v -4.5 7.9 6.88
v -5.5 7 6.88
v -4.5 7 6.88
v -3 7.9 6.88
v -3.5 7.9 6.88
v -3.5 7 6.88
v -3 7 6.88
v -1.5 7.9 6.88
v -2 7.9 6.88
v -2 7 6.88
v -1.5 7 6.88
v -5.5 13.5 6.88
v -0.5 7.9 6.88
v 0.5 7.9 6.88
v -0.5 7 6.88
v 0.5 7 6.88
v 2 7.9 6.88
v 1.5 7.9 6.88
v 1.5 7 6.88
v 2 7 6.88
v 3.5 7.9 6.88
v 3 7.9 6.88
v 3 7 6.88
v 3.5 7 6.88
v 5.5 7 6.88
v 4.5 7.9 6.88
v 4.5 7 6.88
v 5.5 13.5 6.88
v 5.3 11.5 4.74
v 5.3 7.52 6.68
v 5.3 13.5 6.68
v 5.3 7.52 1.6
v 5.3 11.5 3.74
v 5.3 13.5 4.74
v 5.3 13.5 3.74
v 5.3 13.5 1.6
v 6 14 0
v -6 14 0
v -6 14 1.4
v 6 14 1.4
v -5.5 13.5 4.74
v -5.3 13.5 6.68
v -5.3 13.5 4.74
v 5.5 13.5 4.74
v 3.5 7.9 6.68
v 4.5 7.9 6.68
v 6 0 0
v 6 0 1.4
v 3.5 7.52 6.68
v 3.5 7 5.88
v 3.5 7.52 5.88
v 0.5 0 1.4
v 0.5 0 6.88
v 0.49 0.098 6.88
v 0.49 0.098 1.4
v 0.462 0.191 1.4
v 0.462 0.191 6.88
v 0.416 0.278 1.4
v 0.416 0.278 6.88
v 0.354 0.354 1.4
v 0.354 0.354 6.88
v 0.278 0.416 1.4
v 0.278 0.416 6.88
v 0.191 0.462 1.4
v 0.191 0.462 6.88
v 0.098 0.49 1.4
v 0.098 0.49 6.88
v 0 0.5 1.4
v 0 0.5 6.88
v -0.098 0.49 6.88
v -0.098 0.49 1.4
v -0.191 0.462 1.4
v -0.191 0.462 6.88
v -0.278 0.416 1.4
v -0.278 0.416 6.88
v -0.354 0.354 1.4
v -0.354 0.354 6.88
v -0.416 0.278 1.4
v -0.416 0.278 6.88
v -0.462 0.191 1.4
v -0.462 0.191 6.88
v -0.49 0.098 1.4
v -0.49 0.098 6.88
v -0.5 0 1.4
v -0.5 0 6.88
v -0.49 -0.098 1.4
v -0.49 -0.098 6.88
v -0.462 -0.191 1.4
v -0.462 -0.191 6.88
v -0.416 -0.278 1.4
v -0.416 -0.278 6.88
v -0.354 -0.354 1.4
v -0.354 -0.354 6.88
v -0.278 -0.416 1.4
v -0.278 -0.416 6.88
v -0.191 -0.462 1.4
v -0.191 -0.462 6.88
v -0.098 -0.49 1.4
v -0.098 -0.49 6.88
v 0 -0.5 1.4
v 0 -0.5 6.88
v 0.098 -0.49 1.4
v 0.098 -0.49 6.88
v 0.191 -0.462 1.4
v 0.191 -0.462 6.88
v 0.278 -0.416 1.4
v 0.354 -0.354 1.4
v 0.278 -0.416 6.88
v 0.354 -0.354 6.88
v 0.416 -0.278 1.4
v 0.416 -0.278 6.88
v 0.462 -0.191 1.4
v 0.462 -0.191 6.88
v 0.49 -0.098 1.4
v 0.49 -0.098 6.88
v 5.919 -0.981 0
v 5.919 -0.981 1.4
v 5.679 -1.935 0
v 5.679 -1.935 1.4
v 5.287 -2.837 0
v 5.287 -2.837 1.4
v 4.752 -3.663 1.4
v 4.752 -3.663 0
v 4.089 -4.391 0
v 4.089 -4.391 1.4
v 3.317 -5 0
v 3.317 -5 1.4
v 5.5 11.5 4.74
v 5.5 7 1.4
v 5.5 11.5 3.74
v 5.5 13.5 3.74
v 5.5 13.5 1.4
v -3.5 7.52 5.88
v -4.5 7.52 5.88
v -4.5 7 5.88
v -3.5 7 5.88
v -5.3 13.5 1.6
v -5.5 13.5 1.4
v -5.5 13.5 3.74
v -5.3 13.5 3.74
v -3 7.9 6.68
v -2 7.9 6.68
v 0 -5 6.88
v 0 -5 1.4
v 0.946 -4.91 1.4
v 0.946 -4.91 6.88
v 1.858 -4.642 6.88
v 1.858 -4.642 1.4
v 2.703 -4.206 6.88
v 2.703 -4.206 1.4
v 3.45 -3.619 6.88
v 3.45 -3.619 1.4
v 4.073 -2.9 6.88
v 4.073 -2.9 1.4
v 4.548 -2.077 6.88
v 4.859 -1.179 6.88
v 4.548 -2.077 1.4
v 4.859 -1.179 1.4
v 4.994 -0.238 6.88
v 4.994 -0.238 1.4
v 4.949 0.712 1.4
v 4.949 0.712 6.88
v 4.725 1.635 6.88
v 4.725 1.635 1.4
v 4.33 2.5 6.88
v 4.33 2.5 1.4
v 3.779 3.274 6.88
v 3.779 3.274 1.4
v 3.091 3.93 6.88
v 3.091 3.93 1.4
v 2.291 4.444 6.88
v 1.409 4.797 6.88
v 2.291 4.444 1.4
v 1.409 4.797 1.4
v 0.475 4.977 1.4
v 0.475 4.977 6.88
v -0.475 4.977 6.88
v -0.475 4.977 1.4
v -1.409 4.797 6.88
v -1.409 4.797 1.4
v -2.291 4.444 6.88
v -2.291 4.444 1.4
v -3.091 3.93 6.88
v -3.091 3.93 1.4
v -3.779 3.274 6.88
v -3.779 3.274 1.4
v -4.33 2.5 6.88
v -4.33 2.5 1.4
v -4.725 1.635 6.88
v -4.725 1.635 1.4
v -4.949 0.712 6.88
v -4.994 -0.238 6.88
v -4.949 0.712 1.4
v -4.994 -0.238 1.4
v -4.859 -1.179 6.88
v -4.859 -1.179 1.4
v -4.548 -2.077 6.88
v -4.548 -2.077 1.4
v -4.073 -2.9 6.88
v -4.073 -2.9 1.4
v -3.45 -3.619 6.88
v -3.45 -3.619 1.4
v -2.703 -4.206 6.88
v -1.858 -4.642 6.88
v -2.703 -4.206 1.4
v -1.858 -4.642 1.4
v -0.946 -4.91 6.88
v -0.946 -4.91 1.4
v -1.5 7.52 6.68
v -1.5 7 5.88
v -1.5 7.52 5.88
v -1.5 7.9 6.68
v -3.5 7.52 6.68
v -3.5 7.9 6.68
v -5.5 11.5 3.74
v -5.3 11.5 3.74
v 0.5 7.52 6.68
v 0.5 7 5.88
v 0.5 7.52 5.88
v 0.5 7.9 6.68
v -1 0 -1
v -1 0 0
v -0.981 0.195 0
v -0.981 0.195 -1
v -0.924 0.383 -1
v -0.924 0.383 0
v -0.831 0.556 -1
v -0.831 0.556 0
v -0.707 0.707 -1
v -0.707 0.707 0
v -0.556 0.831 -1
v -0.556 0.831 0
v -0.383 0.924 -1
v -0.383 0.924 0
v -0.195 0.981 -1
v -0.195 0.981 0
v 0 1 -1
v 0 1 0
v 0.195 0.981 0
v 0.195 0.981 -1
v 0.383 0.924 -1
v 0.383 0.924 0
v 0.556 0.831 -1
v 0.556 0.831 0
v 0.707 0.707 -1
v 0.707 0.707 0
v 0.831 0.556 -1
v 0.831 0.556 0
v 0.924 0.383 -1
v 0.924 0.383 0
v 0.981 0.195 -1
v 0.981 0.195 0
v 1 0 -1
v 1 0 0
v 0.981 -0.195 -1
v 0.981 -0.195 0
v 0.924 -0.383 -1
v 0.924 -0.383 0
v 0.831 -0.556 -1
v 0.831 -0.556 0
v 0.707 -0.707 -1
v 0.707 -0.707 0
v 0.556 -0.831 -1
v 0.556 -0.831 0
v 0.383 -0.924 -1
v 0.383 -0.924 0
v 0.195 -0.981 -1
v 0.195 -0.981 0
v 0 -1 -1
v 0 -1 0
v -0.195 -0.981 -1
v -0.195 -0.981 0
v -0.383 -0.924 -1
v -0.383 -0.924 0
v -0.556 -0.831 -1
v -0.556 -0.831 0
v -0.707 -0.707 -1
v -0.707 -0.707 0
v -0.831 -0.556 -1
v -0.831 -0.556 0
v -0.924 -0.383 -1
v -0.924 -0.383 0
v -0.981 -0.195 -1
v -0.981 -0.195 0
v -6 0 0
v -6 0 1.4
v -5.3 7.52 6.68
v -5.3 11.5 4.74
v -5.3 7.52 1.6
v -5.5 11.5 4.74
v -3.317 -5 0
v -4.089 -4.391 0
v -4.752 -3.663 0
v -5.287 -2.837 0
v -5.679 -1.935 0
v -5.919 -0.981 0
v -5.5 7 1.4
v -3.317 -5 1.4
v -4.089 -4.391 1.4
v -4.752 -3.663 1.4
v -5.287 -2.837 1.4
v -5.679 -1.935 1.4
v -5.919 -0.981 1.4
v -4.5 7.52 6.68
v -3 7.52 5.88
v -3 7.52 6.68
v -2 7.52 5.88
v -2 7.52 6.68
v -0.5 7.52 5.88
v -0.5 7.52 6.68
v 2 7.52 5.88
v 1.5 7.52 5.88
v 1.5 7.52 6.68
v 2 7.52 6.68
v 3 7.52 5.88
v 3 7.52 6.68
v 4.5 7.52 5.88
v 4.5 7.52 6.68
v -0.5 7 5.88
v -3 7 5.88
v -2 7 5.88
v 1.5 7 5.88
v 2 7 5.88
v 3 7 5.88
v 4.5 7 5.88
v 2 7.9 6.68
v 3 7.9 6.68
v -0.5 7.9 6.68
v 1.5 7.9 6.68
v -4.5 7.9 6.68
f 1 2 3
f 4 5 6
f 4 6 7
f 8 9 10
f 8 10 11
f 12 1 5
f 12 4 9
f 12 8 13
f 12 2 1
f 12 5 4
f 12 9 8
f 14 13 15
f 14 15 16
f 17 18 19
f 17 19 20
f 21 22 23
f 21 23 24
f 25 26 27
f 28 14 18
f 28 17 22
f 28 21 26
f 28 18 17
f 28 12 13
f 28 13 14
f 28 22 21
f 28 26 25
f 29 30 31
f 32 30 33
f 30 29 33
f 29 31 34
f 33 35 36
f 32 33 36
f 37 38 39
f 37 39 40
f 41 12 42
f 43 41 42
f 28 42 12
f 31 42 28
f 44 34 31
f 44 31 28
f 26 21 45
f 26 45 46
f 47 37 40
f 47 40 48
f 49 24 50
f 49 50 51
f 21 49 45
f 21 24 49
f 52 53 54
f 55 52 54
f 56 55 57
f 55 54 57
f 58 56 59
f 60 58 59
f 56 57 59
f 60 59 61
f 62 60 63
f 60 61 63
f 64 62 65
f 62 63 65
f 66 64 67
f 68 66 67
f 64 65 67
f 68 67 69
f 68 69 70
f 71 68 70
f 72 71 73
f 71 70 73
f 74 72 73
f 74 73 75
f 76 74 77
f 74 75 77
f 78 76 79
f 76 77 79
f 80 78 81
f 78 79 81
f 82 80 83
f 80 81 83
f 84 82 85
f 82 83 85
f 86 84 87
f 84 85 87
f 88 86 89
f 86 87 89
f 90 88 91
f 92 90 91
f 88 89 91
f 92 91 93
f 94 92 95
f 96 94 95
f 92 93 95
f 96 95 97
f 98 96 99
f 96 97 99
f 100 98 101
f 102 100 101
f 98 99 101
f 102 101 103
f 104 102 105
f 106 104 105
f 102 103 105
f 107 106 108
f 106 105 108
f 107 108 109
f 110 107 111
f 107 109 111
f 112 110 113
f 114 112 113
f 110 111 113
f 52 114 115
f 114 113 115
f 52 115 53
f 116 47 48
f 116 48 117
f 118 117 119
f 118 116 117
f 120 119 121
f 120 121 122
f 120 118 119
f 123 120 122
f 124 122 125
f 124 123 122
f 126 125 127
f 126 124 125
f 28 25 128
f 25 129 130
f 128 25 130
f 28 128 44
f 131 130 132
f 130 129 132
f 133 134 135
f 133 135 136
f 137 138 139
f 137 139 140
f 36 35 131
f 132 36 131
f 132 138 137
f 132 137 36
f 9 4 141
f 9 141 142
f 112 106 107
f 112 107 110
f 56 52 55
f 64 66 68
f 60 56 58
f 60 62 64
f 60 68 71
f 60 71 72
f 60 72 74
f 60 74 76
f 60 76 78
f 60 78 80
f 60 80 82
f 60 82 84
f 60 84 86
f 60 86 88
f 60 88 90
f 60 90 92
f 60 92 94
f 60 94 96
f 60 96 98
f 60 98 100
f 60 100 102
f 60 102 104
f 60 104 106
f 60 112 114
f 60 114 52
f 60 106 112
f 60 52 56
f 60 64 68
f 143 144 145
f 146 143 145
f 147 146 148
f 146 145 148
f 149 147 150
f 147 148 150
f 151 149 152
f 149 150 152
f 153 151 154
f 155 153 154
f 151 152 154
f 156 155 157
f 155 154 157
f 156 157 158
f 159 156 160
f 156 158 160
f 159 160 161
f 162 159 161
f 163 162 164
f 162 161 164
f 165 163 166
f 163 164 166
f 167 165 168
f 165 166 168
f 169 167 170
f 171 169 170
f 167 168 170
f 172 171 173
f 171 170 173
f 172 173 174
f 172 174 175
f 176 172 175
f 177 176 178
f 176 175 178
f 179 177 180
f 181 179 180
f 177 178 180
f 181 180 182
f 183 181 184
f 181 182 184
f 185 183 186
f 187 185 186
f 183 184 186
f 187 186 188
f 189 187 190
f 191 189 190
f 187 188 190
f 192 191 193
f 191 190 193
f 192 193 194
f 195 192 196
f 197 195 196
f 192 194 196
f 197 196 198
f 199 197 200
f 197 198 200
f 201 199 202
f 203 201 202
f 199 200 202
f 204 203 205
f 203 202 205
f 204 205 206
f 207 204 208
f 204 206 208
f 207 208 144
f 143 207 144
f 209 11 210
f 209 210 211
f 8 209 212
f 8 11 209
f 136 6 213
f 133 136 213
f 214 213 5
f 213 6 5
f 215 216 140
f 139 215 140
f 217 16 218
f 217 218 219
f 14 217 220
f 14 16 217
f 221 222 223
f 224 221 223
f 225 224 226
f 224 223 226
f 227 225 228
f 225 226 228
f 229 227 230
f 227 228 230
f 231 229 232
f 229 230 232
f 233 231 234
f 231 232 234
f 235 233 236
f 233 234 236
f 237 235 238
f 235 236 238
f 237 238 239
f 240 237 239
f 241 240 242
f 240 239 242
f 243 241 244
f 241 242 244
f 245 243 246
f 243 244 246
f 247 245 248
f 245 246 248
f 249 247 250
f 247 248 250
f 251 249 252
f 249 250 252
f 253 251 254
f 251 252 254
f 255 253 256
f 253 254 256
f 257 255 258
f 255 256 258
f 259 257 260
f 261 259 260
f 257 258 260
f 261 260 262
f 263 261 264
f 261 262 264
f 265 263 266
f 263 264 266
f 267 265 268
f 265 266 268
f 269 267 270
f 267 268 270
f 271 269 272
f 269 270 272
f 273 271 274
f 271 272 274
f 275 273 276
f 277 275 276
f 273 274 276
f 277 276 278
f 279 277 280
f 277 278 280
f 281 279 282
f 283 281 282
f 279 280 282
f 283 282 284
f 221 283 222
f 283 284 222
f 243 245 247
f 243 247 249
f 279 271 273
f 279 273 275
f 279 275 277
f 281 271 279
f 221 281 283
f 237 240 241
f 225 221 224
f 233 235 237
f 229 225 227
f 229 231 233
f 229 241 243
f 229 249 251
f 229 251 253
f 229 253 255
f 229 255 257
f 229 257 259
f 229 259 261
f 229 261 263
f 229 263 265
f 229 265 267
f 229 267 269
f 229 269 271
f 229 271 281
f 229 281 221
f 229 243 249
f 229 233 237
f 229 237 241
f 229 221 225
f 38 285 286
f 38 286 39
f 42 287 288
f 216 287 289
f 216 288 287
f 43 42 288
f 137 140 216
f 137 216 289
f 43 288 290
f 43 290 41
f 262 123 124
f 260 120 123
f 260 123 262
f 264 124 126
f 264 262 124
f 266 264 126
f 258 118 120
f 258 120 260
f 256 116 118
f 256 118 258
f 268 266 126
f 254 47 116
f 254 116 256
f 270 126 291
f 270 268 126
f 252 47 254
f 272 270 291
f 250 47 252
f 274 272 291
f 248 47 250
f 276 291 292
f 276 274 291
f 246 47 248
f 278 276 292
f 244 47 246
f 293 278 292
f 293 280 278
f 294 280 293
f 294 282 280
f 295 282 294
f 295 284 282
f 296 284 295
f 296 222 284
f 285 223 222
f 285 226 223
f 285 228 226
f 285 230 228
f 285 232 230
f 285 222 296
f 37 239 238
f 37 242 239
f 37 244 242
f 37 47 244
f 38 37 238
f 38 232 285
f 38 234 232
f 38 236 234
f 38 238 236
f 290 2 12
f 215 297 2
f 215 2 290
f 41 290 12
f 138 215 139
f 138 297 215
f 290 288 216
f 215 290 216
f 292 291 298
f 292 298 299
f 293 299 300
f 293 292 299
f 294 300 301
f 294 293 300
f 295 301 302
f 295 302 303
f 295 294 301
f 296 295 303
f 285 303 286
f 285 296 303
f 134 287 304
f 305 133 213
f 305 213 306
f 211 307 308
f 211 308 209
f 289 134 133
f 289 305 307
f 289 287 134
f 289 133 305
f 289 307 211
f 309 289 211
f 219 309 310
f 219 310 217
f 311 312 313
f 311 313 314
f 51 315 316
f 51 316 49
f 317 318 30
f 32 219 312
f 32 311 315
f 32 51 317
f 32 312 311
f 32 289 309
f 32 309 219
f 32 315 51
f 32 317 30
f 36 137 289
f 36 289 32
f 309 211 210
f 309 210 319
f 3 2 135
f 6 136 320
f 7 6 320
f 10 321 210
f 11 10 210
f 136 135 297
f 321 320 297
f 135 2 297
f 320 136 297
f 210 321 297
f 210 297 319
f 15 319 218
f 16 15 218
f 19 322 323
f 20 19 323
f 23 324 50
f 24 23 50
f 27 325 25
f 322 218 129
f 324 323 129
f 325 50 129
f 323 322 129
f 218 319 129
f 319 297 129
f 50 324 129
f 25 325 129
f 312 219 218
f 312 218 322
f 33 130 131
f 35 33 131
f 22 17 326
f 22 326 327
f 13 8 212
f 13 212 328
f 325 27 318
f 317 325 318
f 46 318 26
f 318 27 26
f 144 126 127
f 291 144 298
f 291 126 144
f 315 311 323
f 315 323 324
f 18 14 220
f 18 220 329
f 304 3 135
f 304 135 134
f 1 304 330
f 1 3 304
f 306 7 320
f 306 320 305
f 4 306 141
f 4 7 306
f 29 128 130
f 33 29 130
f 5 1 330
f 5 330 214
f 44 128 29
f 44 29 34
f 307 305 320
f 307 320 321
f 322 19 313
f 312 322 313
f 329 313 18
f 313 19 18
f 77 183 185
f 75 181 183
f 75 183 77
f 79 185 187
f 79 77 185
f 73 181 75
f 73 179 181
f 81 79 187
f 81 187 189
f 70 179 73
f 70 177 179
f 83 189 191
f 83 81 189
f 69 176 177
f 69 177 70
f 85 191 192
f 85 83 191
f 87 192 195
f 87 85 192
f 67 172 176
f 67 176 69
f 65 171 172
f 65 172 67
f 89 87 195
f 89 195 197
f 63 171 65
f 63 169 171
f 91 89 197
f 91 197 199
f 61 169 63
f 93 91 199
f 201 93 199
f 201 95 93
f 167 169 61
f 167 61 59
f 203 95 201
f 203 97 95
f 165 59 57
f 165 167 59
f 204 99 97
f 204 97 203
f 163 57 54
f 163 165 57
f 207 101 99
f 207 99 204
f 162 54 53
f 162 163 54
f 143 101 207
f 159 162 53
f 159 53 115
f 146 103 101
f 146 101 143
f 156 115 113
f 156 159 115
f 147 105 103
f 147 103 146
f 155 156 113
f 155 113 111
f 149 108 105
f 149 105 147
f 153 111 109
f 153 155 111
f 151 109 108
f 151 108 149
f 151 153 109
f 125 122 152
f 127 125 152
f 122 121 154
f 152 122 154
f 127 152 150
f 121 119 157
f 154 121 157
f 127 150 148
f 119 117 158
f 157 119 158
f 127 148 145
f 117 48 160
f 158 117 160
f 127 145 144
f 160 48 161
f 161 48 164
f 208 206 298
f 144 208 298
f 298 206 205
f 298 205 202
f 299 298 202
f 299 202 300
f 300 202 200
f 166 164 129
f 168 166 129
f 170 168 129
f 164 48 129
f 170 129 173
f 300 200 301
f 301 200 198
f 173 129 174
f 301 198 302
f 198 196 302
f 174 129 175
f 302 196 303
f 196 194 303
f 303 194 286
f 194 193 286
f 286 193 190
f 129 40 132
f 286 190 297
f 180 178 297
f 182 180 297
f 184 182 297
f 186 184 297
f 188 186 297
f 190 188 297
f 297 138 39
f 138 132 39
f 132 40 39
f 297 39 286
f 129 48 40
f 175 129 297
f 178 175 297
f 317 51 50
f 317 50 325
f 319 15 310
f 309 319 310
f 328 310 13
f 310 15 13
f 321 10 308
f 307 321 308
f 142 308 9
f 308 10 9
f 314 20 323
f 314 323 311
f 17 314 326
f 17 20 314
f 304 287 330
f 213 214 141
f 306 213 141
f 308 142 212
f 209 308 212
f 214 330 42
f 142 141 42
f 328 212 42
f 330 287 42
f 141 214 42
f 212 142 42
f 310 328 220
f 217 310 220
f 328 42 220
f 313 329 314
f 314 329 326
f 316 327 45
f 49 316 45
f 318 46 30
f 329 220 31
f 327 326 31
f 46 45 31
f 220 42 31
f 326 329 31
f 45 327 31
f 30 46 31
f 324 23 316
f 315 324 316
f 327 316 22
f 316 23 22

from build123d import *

# Parameters (mm, degrees)
BOSS_EXTRUDE2_DEPTH = 1.4
SKETCH3_W           = 11
SKETCH3_H           = 6.5
BOSS_EXTRUDE4_DEPTH = 5.48
SKETCH4_W           = 10.6
SKETCH4_H           = 5.08
CUT_EXTRUDE1_DEPTH  = 5.98
SKETCH6_W           = 1
SKETCH6_H           = 2
CUT_EXTRUDE2_DEPTH  = 11.98
SKETCH7_W           = 1
SKETCH7_H           = 0.9
CUT_EXTRUDE3_DEPTH  = 1
SKETCH8_R           = 5
BOSS_EXTRUDE5_DEPTH = 5.48
SKETCH9_R           = 0.5
CUT_EXTRUDE4_DEPTH  = 5.48
SKETCH10_R          = 1
BOSS_EXTRUDE6_DEPTH = 1


with BuildPart() as part:
    # Sketch1 → Boss-Extrude2 (new body)
    with BuildSketch(Plane.XY):
        with BuildLine():
            Line((3.31662479, -5), (-3.31662479, -5))
            ThreePointArc((-3.31662479, -5), (-5.286764074, -2.837274331), (-6, 0))
            Line((-6, 0), (-6, 14))
            Line((-6, 14), (6, 14))
            Line((6, 14), (6, 0))
            ThreePointArc((6, 0), (5.286764074, -2.837274331), (3.31662479, -5))
        make_face()
    extrude(amount=BOSS_EXTRUDE2_DEPTH)

    # Sketch3 → Boss-Extrude4 (add)
    with BuildSketch(Plane.XY.offset(1.4)):
        with Locations((0, 10.25)):
            Rectangle(SKETCH3_W, SKETCH3_H)
    extrude(amount=BOSS_EXTRUDE4_DEPTH)

    # Sketch4 → Cut-Extrude1 (cut)
    with BuildSketch(Plane(origin=(0, 13.5, 0), x_dir=(1, 0, 0), z_dir=(0, 1, 0))):
        with Locations((0, -4.14)):
            Rectangle(SKETCH4_W, SKETCH4_H)
    extrude(amount=-CUT_EXTRUDE1_DEPTH, mode=Mode.SUBTRACT)

    # Sketch6 → Cut-Extrude2 (cut)
    with BuildSketch(Plane(origin=(5.5, 0, 0), x_dir=(0, 0, -1), z_dir=(1, 0, 0))):
        with Locations((-4.24, 12.5)):
            Rectangle(SKETCH6_W, SKETCH6_H)
    extrude(amount=-CUT_EXTRUDE2_DEPTH, mode=Mode.SUBTRACT)

    # Sketch7 → Cut-Extrude3 (cut)
    with BuildSketch(Plane.XY.offset(6.88)):
        with Locations((2.5, 7.45)):
            Rectangle(SKETCH7_W, SKETCH7_H)
        with Locations((1, 7.45)):
            Rectangle(SKETCH7_W, SKETCH7_H)
        with Locations((-1, 7.45)):
            Rectangle(SKETCH7_W, SKETCH7_H)
        with Locations((-2.5, 7.45)):
            Rectangle(SKETCH7_W, SKETCH7_H)
        with Locations((-4, 7.45)):
            Rectangle(SKETCH7_W, SKETCH7_H)
        with Locations((4, 7.45)):
            Rectangle(SKETCH7_W, SKETCH7_H)
    extrude(amount=-CUT_EXTRUDE3_DEPTH, mode=Mode.SUBTRACT)

    # Sketch8 → Boss-Extrude5 (add)
    with BuildSketch(Plane.XY.offset(1.4)):
        with Locations(Location((0, 0, 0), (0, 0, 270))):
            Circle(SKETCH8_R)
    extrude(amount=BOSS_EXTRUDE5_DEPTH)

    # Sketch9 → Cut-Extrude4 (cut)
    with BuildSketch(Plane.XY.offset(6.88)):
        Circle(SKETCH9_R)
    extrude(amount=-CUT_EXTRUDE4_DEPTH, mode=Mode.SUBTRACT)

    # Sketch10 → Boss-Extrude6 (add)
    with BuildSketch(Plane(origin=(0, 0, 0), x_dir=(-1, 0, 0), z_dir=(0, 0, -1))):
        Circle(SKETCH10_R)
    extrude(amount=BOSS_EXTRUDE6_DEPTH)


solid = part.part
